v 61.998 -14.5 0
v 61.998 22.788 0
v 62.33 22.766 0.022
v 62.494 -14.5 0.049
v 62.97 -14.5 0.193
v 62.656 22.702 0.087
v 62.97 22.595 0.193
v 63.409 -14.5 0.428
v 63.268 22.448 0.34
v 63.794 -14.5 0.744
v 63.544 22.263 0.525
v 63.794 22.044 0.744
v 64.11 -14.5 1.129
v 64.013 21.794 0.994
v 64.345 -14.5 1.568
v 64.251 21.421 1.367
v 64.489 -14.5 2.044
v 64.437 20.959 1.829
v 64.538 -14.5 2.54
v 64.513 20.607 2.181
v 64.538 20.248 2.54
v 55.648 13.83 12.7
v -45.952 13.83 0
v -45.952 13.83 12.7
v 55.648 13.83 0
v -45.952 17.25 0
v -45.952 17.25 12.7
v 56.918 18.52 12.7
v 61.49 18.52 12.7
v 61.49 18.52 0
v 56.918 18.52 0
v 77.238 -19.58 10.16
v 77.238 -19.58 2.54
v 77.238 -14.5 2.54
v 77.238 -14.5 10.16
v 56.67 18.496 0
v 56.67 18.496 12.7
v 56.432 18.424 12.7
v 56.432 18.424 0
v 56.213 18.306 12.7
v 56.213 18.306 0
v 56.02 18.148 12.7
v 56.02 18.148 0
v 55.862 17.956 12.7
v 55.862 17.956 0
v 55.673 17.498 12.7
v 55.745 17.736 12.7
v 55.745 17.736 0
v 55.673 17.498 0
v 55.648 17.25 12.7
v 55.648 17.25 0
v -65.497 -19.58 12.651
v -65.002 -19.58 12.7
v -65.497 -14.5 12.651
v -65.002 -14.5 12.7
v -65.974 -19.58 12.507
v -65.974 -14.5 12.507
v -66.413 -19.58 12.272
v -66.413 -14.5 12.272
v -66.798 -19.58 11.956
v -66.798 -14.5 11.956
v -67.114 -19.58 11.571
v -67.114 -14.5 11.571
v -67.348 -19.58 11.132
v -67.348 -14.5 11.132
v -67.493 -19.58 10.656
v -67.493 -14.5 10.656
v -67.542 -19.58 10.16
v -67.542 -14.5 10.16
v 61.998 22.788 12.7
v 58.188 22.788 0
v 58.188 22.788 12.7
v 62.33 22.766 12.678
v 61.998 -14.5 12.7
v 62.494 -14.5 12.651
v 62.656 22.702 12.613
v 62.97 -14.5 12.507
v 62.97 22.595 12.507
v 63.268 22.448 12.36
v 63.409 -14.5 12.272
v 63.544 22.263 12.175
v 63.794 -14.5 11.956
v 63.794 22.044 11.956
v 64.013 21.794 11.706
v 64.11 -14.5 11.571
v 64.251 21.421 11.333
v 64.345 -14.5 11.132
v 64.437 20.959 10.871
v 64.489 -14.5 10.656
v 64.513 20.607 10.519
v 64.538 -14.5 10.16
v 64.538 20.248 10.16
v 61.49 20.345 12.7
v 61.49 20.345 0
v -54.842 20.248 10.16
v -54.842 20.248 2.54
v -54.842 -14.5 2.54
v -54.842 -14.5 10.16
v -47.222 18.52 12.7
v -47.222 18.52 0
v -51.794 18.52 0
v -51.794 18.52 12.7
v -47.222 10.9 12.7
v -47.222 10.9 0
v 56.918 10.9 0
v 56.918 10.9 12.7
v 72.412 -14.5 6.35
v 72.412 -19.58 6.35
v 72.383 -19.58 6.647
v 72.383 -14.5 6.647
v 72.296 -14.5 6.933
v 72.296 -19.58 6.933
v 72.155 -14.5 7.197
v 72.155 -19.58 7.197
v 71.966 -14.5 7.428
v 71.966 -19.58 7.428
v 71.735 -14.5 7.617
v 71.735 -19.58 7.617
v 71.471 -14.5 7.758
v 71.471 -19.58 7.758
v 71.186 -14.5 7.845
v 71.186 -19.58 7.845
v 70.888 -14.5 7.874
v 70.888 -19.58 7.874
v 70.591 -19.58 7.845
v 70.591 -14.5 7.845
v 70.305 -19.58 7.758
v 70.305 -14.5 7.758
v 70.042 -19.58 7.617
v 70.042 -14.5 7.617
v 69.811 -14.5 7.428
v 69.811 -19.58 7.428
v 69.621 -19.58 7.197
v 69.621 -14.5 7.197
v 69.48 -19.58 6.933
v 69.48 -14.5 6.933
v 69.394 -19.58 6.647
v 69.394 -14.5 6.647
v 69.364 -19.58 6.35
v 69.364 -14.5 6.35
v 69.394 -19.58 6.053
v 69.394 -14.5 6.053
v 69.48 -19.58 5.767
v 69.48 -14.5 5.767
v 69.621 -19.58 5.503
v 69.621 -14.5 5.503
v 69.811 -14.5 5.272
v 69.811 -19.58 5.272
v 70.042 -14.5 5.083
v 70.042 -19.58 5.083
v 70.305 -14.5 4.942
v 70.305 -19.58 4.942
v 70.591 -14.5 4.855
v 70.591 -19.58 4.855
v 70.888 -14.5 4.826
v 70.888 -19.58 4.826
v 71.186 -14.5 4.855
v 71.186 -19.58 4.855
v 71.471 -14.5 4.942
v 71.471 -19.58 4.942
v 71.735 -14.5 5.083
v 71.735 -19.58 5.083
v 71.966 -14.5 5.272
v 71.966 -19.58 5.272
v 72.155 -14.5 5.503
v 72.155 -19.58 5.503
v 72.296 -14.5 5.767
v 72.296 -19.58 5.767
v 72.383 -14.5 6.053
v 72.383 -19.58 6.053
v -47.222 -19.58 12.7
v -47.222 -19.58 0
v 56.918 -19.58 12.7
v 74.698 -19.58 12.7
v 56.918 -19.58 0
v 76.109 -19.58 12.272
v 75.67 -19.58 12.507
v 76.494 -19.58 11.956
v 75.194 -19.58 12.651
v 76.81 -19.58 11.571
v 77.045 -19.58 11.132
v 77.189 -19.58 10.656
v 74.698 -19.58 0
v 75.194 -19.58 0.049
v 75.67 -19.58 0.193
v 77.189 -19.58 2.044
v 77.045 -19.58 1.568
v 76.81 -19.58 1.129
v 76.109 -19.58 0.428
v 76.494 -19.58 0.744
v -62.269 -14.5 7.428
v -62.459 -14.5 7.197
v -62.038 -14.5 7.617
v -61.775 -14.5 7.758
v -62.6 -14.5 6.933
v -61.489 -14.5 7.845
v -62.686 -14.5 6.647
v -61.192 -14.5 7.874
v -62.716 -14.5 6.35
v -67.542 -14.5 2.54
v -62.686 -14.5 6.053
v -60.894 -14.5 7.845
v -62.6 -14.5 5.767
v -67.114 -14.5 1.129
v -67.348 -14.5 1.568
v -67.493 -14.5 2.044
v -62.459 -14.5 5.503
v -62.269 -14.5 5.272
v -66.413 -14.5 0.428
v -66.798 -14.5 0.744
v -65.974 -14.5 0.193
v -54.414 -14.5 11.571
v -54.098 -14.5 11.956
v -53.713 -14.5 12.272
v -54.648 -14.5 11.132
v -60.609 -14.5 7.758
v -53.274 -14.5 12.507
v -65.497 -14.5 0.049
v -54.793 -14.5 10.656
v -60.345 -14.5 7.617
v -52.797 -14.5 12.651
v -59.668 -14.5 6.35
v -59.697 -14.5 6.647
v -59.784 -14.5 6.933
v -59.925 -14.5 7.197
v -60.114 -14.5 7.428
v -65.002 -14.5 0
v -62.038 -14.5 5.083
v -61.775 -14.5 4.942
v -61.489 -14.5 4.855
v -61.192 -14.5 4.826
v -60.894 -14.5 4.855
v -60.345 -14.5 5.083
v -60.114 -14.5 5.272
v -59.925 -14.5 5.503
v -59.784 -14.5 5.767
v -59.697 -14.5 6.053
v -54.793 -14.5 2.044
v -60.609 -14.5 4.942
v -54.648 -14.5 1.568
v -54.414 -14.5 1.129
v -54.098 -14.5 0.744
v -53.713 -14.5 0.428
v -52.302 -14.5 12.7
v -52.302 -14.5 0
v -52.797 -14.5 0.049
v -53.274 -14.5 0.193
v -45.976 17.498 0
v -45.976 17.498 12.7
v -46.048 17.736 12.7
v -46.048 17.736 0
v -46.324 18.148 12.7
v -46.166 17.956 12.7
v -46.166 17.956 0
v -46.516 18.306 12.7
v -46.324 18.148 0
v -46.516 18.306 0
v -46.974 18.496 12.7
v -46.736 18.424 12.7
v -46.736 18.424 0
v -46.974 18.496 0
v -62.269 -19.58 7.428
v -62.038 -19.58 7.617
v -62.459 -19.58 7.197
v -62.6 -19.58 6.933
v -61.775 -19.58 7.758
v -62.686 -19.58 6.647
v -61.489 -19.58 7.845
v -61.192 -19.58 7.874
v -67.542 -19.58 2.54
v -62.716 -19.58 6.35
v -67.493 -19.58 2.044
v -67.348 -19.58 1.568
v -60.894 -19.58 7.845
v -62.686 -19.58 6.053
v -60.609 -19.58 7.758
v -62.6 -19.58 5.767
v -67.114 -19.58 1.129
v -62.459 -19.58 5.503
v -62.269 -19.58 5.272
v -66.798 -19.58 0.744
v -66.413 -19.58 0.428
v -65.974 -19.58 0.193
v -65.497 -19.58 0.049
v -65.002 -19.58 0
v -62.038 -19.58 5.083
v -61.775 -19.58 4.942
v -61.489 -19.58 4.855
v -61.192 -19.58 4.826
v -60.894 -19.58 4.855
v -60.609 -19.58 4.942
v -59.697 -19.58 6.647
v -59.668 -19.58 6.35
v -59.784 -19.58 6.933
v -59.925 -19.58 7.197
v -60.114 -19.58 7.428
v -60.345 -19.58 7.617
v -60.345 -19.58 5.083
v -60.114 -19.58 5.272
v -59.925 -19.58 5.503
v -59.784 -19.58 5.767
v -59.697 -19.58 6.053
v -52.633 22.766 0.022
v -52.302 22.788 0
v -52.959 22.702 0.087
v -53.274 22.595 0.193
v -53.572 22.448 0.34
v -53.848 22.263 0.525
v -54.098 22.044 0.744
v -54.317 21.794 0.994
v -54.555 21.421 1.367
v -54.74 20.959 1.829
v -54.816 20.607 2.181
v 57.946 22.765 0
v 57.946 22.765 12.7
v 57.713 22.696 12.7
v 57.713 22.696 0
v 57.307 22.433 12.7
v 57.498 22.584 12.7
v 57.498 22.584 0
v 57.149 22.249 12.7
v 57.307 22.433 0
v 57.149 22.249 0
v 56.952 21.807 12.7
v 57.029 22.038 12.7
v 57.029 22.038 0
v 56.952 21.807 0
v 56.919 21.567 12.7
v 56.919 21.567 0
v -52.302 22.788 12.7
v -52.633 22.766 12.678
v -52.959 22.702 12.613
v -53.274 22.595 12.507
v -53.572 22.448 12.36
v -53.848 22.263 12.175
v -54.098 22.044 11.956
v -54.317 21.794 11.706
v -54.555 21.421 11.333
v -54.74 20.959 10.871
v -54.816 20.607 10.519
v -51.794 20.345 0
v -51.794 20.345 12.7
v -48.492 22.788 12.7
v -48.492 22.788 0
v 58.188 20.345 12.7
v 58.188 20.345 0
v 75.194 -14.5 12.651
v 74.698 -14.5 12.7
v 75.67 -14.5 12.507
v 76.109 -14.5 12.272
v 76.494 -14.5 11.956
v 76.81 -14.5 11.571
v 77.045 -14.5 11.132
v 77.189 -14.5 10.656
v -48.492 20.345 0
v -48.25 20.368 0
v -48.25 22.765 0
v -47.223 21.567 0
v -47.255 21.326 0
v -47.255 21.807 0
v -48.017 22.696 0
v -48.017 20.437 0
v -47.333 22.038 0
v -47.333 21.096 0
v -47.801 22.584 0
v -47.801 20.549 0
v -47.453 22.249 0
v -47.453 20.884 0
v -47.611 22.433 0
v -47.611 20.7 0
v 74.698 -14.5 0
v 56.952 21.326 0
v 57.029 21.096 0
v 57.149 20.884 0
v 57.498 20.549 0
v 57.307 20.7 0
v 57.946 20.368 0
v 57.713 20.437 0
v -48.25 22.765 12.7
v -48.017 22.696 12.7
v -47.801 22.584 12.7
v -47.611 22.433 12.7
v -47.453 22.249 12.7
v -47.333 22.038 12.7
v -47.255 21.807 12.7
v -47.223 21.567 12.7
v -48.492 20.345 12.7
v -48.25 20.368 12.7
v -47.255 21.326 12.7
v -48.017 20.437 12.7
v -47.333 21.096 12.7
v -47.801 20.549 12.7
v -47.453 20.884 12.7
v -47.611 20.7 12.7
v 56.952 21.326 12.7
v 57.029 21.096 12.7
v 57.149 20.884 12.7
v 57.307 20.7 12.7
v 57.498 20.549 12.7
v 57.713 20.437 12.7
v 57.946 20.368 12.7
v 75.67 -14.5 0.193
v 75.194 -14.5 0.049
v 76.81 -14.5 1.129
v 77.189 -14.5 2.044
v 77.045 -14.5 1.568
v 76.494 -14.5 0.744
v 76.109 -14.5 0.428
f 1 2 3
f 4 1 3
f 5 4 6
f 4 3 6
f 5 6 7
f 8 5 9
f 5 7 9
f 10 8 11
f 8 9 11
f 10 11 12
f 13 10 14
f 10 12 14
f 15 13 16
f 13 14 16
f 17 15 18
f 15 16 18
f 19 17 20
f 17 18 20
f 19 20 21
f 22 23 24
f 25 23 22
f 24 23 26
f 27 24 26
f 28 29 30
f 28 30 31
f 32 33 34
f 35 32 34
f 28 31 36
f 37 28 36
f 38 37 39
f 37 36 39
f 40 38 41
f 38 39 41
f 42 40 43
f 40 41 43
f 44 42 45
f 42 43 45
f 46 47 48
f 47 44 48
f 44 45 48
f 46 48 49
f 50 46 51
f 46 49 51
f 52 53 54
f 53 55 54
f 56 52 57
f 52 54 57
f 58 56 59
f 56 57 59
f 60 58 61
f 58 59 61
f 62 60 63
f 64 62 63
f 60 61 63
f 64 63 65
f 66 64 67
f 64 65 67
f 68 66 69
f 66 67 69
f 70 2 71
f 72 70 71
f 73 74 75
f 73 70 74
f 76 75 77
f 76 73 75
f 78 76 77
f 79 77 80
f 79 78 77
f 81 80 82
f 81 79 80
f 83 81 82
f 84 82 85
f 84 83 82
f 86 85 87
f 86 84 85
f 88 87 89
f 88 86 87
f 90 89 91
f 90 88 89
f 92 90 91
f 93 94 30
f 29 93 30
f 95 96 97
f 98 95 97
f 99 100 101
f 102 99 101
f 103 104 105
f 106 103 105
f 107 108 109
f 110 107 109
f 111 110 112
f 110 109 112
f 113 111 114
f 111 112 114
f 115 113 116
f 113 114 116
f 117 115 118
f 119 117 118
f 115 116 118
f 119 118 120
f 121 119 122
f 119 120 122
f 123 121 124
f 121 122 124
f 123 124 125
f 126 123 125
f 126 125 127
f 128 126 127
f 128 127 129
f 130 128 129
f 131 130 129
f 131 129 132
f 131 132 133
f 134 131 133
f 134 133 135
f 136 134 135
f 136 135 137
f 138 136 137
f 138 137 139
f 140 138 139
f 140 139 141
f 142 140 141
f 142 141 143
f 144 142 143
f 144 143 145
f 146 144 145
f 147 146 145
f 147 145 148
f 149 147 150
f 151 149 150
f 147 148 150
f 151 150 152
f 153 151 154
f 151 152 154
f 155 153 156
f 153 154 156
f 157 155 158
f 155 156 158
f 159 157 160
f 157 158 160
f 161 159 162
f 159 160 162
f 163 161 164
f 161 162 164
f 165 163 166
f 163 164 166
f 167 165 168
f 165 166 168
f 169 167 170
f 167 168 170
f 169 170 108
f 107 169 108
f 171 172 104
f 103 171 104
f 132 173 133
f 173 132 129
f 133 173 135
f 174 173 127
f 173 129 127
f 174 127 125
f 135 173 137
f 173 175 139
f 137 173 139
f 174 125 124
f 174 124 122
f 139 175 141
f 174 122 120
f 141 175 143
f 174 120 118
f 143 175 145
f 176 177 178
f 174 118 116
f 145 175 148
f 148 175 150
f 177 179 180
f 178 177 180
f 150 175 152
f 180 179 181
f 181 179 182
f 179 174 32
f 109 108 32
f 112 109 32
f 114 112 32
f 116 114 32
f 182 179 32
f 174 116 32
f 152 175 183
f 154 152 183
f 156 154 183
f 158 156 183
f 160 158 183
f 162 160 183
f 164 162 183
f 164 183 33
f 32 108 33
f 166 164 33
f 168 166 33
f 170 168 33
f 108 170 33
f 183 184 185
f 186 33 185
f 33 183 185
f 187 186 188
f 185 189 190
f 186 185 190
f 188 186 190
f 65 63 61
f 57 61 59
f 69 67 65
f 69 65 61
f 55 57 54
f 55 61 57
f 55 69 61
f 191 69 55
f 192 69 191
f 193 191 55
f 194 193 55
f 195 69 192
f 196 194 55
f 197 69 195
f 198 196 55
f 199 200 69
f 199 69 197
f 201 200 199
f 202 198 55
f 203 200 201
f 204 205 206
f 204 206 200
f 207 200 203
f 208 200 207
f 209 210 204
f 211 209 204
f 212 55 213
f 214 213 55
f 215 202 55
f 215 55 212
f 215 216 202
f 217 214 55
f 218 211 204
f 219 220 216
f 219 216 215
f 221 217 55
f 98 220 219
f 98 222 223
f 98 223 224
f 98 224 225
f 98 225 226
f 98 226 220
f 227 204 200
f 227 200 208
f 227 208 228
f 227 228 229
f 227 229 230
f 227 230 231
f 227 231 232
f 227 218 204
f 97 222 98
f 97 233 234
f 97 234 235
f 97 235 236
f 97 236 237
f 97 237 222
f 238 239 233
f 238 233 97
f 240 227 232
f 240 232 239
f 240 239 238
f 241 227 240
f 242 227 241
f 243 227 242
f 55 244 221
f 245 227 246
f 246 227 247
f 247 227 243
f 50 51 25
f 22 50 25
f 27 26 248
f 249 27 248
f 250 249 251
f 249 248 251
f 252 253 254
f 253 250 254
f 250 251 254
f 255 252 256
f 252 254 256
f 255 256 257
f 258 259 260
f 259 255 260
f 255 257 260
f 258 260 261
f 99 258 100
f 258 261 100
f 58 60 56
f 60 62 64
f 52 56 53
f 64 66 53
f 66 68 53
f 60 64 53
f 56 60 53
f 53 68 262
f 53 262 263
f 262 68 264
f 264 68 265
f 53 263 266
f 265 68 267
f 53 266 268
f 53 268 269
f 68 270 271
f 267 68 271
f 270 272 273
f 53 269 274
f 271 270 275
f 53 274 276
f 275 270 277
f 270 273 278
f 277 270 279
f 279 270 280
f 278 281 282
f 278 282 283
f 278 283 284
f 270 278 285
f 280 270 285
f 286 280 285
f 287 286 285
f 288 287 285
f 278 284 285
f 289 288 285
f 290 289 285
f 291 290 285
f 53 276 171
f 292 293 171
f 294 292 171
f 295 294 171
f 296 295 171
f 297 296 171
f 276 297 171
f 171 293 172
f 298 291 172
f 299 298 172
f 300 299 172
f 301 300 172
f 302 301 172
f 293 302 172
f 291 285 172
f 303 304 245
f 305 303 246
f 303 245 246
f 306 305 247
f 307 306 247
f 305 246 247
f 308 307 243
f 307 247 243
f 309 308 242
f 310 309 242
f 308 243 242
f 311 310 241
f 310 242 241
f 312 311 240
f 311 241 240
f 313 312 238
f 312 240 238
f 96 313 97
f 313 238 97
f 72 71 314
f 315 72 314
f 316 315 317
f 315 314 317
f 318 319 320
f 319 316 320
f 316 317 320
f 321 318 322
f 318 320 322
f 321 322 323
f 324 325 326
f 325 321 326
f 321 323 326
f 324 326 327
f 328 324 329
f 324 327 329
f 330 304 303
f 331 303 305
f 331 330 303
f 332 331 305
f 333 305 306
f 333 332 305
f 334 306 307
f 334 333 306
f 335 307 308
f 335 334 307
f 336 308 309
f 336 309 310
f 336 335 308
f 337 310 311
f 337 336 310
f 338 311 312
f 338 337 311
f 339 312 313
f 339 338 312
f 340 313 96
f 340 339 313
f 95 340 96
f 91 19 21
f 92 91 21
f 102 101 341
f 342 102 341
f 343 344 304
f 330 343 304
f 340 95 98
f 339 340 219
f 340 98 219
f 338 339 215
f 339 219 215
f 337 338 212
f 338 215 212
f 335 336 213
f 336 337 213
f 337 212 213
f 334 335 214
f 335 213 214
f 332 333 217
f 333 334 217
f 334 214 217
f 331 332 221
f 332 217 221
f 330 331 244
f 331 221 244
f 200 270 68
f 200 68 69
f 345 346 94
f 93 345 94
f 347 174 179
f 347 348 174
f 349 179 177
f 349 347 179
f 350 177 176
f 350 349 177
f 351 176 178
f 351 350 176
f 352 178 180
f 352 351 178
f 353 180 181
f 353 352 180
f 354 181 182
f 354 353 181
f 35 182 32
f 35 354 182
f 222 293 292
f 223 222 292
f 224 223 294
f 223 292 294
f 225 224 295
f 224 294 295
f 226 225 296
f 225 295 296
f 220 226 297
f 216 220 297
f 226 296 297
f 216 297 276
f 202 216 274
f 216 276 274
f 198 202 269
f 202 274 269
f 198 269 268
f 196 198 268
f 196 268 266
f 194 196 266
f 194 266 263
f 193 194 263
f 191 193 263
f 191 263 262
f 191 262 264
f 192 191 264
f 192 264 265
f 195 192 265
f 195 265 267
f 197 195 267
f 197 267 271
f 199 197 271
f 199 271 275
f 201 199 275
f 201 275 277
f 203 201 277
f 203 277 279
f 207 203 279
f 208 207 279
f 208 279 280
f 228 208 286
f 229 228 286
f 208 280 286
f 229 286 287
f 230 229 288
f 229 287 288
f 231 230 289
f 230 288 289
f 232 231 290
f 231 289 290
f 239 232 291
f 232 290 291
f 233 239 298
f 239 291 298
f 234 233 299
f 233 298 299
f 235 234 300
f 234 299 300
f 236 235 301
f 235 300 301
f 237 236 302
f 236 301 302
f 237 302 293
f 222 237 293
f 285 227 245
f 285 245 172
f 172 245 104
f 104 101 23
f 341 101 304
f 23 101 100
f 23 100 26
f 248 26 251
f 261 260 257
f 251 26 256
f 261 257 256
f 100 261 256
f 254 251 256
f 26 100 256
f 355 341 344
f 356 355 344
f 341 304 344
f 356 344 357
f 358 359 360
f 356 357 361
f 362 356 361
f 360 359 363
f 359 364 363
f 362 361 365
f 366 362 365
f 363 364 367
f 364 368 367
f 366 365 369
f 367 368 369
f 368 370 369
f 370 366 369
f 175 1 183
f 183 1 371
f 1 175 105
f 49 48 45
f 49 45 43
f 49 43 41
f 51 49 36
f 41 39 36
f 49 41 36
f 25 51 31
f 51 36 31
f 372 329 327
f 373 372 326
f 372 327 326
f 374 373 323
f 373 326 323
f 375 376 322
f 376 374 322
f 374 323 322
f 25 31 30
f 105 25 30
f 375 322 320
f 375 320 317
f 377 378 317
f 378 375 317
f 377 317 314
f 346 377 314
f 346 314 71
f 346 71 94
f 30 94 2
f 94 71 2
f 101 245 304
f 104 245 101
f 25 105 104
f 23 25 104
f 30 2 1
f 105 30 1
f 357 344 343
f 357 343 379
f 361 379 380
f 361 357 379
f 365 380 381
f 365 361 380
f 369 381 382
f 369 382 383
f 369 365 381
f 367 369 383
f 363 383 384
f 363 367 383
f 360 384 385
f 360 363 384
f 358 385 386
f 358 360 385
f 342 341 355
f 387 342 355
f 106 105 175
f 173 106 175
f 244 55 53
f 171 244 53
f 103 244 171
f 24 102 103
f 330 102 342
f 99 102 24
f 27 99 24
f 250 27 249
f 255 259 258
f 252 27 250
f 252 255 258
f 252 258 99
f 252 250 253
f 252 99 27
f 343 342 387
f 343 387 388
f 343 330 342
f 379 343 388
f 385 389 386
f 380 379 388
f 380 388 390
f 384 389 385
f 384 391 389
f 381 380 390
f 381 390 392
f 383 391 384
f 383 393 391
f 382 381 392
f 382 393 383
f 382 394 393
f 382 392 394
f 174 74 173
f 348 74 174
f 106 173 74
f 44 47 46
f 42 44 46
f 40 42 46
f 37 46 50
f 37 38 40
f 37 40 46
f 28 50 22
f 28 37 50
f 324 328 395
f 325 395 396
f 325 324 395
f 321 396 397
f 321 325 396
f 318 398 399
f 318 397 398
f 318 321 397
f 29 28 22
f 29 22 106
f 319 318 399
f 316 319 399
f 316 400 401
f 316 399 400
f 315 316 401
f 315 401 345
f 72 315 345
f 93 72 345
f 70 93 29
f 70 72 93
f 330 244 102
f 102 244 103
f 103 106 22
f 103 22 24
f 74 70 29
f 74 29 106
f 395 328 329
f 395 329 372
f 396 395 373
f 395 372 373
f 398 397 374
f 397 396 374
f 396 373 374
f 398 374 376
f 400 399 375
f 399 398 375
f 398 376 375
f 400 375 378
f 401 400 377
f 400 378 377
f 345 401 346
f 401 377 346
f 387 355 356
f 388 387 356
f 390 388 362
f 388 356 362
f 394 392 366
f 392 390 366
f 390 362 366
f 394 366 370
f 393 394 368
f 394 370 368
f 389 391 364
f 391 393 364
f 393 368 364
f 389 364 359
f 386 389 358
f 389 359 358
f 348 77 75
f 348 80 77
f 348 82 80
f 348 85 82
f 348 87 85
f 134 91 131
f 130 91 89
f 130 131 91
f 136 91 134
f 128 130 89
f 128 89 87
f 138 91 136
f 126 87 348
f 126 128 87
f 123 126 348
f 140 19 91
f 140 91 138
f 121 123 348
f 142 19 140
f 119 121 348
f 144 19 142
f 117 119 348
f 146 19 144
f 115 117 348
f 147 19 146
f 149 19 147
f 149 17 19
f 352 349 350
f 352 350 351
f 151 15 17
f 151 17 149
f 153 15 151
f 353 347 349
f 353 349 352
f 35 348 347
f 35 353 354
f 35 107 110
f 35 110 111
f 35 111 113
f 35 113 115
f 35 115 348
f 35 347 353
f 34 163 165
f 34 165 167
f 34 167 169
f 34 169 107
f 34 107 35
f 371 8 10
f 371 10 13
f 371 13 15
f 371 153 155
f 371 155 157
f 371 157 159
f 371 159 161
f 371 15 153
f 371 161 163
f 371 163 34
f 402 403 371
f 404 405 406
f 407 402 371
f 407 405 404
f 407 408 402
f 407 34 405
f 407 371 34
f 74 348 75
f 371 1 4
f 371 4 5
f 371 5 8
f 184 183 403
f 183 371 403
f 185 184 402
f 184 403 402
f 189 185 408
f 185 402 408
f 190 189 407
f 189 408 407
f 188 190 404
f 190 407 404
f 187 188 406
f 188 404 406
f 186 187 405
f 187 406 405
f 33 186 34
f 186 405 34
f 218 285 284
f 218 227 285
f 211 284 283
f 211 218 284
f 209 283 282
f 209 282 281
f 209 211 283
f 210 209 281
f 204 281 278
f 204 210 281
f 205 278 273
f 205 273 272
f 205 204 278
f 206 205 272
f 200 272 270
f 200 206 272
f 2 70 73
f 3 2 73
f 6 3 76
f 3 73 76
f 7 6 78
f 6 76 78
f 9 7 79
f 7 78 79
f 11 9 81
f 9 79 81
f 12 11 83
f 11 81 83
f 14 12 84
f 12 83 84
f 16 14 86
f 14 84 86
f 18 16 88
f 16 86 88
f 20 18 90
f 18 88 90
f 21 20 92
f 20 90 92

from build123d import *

# Parameters (mm, degrees)
F0_W        = 7.62
F0_H        = 5.08
F0_W_2      = 12.7
F0_W_3      = 1.27
F0_H_2      = 4.6902727336
F0_H_3      = 2.9297272664
F0_W_4      = 101.6
F1_DEPTH    = 12.7
F2_T1_DEPTH = 19.05
F3_R        = 1.524
F4_DEPTH    = 25.4
F5_R        = 2.54


# Not quite as in the source:
# - a fillet or chamfer that OpenCascade refuses, or shapes differently, is made with other operations: its cross-section is extruded or revolved along the edge and cut away or added


with BuildPart() as f1:
    # F0 (on Top) → F1 (new body)
    with BuildSketch(Plane.XY):
        Polygon((-47.2217758975, 22.7881683916), (-54.8417758975, 22.7881683916), (-54.8417758975, -14.4997123967), (-47.2217758975, -14.4997123967), (-47.2217758975, 10.9002876033), (-47.2217758975, 13.8300148697), (-47.2217758975, 18.5202876033), (-51.7937758975, 18.5202876033), (-51.7937758975, 20.344916165), (-47.2217758975, 20.344916165), align=None)
        with Locations((-51.0317758975, -17.0397123967)):
            Rectangle(F0_W, F0_H)
        with Locations((-61.1917758975, -17.0397123967)):
            Rectangle(F0_W_2, F0_H)
        Polygon((64.5382241025, 22.7881683916), (56.9182241025, 22.7881683916), (56.9182241025, 20.344916165), (61.4902241025, 20.344916165), (61.4902241025, 18.5202876033), (56.9182241025, 18.5202876033), (56.9182241025, 13.8300148697), (56.9182241025, 10.9002876033), (56.9182241025, -14.4997123967), (64.5382241025, -14.4997123967), align=None)
        with Locations((-46.5867758975, 16.1751512365)):
            Rectangle(F0_W_3, F0_H_2)
        with Locations((60.7282241025, -17.0397123967)):
            Rectangle(F0_W, F0_H)
        with Locations((-46.5867758975, 12.3651512365)):
            Rectangle(F0_W_3, F0_H_3)
        with Locations((70.8882241025, -17.0397123967)):
            Rectangle(F0_W_2, F0_H)
        with Locations((56.2832241025, 16.1751512365)):
            Rectangle(F0_W_3, F0_H_2)
        with Locations((56.2832241025, 12.3651512365)):
            Rectangle(F0_W_3, F0_H_3)
        with Locations((4.8482241025, 12.3651512365)):
            Rectangle(F0_W_4, F0_H_3)
    extrude(amount=F1_DEPTH)

    # F2: fillet of radius 1.27 on 6 edges, made by hand

    # F2_s2 → F2_t1 (cut)
    with BuildSketch(Plane.XY.offset(-3.175)):
        with BuildLine():
            ThreePointArc((-48.4917758975, 22.7881683916), (-47.5937502854, 22.4161940037), (-47.2217758975, 21.5181683916))
            Line((-47.2217758975, 21.5181683916), (-47.2217758975, 22.7881683916))
            Line((-47.2217758975, 22.7881683916), (-48.4917758975, 22.7881683916))
        make_face()
        with BuildLine():
            ThreePointArc((-45.9517758975, 17.2502876033), (-46.3237502854, 18.1483132154), (-47.2217758975, 18.5202876033))
            Line((-47.2217758975, 18.5202876033), (-45.9517758975, 18.5202876033))
            Line((-45.9517758975, 18.5202876033), (-45.9517758975, 17.2502876033))
        make_face()
        with BuildLine():
            ThreePointArc((-48.4917758975, 20.344916165), (-47.5937502854, 20.7168905529), (-47.2217758975, 21.614916165))
            Line((-47.2217758975, 21.614916165), (-47.2217758975, 20.344916165))
            Line((-47.2217758975, 20.344916165), (-48.4917758975, 20.344916165))
        make_face()
        with BuildLine():
            ThreePointArc((56.9182241025, 18.5202876033), (56.0201984904, 18.1483132154), (55.6482241025, 17.2502876033))
            Line((55.6482241025, 17.2502876033), (55.6482241025, 18.5202876033))
            Line((55.6482241025, 18.5202876033), (56.9182241025, 18.5202876033))
        make_face()
        with BuildLine():
            ThreePointArc((56.9182241025, 21.614916165), (57.2901984904, 20.7168905529), (58.1882241025, 20.344916165))
            Line((58.1882241025, 20.344916165), (56.9182241025, 20.344916165))
            Line((56.9182241025, 20.344916165), (56.9182241025, 21.614916165))
        make_face()
        with BuildLine():
            ThreePointArc((58.1882241025, 22.7881683916), (57.2901984904, 22.4161940037), (56.9182241025, 21.5181683916))
            Line((56.9182241025, 21.5181683916), (56.9182241025, 22.7881683916))
            Line((56.9182241025, 22.7881683916), (58.1882241025, 22.7881683916))
        make_face()
    extrude(amount=F2_T1_DEPTH, mode=Mode.SUBTRACT)

    # F3 (on face) → F4 (cut)
    with BuildSketch(Plane.XZ.offset(19.5797123967)):
        with Locations((-61.1917758975, 6.35)):
            Circle(F3_R)
        with Locations((70.8882241025, 6.35)):
            Circle(F3_R)
    extrude(amount=-F4_DEPTH, mode=Mode.SUBTRACT)

    # F5
    f5_edges = [f1.edges().sort_by_distance(p)[0] for p in [
        (77.238224, -17.039712, 12.7),
        (77.238224, -17.039712, 0),
        (64.538224, 22.788168, 6.35),
        (-54.841776, 22.788168, 6.35),
        (-67.541776, -17.039712, 0),
        (-67.541776, -17.039712, 12.7),
        (-54.841776, 4.144228, 0),
        (-54.841776, 4.144228, 12.7),
        (64.538224, 4.144228, 0),
        (64.538224, 4.144228, 12.7),
    ]]
    fillet(f5_edges, radius=F5_R)


solid = f1.part
